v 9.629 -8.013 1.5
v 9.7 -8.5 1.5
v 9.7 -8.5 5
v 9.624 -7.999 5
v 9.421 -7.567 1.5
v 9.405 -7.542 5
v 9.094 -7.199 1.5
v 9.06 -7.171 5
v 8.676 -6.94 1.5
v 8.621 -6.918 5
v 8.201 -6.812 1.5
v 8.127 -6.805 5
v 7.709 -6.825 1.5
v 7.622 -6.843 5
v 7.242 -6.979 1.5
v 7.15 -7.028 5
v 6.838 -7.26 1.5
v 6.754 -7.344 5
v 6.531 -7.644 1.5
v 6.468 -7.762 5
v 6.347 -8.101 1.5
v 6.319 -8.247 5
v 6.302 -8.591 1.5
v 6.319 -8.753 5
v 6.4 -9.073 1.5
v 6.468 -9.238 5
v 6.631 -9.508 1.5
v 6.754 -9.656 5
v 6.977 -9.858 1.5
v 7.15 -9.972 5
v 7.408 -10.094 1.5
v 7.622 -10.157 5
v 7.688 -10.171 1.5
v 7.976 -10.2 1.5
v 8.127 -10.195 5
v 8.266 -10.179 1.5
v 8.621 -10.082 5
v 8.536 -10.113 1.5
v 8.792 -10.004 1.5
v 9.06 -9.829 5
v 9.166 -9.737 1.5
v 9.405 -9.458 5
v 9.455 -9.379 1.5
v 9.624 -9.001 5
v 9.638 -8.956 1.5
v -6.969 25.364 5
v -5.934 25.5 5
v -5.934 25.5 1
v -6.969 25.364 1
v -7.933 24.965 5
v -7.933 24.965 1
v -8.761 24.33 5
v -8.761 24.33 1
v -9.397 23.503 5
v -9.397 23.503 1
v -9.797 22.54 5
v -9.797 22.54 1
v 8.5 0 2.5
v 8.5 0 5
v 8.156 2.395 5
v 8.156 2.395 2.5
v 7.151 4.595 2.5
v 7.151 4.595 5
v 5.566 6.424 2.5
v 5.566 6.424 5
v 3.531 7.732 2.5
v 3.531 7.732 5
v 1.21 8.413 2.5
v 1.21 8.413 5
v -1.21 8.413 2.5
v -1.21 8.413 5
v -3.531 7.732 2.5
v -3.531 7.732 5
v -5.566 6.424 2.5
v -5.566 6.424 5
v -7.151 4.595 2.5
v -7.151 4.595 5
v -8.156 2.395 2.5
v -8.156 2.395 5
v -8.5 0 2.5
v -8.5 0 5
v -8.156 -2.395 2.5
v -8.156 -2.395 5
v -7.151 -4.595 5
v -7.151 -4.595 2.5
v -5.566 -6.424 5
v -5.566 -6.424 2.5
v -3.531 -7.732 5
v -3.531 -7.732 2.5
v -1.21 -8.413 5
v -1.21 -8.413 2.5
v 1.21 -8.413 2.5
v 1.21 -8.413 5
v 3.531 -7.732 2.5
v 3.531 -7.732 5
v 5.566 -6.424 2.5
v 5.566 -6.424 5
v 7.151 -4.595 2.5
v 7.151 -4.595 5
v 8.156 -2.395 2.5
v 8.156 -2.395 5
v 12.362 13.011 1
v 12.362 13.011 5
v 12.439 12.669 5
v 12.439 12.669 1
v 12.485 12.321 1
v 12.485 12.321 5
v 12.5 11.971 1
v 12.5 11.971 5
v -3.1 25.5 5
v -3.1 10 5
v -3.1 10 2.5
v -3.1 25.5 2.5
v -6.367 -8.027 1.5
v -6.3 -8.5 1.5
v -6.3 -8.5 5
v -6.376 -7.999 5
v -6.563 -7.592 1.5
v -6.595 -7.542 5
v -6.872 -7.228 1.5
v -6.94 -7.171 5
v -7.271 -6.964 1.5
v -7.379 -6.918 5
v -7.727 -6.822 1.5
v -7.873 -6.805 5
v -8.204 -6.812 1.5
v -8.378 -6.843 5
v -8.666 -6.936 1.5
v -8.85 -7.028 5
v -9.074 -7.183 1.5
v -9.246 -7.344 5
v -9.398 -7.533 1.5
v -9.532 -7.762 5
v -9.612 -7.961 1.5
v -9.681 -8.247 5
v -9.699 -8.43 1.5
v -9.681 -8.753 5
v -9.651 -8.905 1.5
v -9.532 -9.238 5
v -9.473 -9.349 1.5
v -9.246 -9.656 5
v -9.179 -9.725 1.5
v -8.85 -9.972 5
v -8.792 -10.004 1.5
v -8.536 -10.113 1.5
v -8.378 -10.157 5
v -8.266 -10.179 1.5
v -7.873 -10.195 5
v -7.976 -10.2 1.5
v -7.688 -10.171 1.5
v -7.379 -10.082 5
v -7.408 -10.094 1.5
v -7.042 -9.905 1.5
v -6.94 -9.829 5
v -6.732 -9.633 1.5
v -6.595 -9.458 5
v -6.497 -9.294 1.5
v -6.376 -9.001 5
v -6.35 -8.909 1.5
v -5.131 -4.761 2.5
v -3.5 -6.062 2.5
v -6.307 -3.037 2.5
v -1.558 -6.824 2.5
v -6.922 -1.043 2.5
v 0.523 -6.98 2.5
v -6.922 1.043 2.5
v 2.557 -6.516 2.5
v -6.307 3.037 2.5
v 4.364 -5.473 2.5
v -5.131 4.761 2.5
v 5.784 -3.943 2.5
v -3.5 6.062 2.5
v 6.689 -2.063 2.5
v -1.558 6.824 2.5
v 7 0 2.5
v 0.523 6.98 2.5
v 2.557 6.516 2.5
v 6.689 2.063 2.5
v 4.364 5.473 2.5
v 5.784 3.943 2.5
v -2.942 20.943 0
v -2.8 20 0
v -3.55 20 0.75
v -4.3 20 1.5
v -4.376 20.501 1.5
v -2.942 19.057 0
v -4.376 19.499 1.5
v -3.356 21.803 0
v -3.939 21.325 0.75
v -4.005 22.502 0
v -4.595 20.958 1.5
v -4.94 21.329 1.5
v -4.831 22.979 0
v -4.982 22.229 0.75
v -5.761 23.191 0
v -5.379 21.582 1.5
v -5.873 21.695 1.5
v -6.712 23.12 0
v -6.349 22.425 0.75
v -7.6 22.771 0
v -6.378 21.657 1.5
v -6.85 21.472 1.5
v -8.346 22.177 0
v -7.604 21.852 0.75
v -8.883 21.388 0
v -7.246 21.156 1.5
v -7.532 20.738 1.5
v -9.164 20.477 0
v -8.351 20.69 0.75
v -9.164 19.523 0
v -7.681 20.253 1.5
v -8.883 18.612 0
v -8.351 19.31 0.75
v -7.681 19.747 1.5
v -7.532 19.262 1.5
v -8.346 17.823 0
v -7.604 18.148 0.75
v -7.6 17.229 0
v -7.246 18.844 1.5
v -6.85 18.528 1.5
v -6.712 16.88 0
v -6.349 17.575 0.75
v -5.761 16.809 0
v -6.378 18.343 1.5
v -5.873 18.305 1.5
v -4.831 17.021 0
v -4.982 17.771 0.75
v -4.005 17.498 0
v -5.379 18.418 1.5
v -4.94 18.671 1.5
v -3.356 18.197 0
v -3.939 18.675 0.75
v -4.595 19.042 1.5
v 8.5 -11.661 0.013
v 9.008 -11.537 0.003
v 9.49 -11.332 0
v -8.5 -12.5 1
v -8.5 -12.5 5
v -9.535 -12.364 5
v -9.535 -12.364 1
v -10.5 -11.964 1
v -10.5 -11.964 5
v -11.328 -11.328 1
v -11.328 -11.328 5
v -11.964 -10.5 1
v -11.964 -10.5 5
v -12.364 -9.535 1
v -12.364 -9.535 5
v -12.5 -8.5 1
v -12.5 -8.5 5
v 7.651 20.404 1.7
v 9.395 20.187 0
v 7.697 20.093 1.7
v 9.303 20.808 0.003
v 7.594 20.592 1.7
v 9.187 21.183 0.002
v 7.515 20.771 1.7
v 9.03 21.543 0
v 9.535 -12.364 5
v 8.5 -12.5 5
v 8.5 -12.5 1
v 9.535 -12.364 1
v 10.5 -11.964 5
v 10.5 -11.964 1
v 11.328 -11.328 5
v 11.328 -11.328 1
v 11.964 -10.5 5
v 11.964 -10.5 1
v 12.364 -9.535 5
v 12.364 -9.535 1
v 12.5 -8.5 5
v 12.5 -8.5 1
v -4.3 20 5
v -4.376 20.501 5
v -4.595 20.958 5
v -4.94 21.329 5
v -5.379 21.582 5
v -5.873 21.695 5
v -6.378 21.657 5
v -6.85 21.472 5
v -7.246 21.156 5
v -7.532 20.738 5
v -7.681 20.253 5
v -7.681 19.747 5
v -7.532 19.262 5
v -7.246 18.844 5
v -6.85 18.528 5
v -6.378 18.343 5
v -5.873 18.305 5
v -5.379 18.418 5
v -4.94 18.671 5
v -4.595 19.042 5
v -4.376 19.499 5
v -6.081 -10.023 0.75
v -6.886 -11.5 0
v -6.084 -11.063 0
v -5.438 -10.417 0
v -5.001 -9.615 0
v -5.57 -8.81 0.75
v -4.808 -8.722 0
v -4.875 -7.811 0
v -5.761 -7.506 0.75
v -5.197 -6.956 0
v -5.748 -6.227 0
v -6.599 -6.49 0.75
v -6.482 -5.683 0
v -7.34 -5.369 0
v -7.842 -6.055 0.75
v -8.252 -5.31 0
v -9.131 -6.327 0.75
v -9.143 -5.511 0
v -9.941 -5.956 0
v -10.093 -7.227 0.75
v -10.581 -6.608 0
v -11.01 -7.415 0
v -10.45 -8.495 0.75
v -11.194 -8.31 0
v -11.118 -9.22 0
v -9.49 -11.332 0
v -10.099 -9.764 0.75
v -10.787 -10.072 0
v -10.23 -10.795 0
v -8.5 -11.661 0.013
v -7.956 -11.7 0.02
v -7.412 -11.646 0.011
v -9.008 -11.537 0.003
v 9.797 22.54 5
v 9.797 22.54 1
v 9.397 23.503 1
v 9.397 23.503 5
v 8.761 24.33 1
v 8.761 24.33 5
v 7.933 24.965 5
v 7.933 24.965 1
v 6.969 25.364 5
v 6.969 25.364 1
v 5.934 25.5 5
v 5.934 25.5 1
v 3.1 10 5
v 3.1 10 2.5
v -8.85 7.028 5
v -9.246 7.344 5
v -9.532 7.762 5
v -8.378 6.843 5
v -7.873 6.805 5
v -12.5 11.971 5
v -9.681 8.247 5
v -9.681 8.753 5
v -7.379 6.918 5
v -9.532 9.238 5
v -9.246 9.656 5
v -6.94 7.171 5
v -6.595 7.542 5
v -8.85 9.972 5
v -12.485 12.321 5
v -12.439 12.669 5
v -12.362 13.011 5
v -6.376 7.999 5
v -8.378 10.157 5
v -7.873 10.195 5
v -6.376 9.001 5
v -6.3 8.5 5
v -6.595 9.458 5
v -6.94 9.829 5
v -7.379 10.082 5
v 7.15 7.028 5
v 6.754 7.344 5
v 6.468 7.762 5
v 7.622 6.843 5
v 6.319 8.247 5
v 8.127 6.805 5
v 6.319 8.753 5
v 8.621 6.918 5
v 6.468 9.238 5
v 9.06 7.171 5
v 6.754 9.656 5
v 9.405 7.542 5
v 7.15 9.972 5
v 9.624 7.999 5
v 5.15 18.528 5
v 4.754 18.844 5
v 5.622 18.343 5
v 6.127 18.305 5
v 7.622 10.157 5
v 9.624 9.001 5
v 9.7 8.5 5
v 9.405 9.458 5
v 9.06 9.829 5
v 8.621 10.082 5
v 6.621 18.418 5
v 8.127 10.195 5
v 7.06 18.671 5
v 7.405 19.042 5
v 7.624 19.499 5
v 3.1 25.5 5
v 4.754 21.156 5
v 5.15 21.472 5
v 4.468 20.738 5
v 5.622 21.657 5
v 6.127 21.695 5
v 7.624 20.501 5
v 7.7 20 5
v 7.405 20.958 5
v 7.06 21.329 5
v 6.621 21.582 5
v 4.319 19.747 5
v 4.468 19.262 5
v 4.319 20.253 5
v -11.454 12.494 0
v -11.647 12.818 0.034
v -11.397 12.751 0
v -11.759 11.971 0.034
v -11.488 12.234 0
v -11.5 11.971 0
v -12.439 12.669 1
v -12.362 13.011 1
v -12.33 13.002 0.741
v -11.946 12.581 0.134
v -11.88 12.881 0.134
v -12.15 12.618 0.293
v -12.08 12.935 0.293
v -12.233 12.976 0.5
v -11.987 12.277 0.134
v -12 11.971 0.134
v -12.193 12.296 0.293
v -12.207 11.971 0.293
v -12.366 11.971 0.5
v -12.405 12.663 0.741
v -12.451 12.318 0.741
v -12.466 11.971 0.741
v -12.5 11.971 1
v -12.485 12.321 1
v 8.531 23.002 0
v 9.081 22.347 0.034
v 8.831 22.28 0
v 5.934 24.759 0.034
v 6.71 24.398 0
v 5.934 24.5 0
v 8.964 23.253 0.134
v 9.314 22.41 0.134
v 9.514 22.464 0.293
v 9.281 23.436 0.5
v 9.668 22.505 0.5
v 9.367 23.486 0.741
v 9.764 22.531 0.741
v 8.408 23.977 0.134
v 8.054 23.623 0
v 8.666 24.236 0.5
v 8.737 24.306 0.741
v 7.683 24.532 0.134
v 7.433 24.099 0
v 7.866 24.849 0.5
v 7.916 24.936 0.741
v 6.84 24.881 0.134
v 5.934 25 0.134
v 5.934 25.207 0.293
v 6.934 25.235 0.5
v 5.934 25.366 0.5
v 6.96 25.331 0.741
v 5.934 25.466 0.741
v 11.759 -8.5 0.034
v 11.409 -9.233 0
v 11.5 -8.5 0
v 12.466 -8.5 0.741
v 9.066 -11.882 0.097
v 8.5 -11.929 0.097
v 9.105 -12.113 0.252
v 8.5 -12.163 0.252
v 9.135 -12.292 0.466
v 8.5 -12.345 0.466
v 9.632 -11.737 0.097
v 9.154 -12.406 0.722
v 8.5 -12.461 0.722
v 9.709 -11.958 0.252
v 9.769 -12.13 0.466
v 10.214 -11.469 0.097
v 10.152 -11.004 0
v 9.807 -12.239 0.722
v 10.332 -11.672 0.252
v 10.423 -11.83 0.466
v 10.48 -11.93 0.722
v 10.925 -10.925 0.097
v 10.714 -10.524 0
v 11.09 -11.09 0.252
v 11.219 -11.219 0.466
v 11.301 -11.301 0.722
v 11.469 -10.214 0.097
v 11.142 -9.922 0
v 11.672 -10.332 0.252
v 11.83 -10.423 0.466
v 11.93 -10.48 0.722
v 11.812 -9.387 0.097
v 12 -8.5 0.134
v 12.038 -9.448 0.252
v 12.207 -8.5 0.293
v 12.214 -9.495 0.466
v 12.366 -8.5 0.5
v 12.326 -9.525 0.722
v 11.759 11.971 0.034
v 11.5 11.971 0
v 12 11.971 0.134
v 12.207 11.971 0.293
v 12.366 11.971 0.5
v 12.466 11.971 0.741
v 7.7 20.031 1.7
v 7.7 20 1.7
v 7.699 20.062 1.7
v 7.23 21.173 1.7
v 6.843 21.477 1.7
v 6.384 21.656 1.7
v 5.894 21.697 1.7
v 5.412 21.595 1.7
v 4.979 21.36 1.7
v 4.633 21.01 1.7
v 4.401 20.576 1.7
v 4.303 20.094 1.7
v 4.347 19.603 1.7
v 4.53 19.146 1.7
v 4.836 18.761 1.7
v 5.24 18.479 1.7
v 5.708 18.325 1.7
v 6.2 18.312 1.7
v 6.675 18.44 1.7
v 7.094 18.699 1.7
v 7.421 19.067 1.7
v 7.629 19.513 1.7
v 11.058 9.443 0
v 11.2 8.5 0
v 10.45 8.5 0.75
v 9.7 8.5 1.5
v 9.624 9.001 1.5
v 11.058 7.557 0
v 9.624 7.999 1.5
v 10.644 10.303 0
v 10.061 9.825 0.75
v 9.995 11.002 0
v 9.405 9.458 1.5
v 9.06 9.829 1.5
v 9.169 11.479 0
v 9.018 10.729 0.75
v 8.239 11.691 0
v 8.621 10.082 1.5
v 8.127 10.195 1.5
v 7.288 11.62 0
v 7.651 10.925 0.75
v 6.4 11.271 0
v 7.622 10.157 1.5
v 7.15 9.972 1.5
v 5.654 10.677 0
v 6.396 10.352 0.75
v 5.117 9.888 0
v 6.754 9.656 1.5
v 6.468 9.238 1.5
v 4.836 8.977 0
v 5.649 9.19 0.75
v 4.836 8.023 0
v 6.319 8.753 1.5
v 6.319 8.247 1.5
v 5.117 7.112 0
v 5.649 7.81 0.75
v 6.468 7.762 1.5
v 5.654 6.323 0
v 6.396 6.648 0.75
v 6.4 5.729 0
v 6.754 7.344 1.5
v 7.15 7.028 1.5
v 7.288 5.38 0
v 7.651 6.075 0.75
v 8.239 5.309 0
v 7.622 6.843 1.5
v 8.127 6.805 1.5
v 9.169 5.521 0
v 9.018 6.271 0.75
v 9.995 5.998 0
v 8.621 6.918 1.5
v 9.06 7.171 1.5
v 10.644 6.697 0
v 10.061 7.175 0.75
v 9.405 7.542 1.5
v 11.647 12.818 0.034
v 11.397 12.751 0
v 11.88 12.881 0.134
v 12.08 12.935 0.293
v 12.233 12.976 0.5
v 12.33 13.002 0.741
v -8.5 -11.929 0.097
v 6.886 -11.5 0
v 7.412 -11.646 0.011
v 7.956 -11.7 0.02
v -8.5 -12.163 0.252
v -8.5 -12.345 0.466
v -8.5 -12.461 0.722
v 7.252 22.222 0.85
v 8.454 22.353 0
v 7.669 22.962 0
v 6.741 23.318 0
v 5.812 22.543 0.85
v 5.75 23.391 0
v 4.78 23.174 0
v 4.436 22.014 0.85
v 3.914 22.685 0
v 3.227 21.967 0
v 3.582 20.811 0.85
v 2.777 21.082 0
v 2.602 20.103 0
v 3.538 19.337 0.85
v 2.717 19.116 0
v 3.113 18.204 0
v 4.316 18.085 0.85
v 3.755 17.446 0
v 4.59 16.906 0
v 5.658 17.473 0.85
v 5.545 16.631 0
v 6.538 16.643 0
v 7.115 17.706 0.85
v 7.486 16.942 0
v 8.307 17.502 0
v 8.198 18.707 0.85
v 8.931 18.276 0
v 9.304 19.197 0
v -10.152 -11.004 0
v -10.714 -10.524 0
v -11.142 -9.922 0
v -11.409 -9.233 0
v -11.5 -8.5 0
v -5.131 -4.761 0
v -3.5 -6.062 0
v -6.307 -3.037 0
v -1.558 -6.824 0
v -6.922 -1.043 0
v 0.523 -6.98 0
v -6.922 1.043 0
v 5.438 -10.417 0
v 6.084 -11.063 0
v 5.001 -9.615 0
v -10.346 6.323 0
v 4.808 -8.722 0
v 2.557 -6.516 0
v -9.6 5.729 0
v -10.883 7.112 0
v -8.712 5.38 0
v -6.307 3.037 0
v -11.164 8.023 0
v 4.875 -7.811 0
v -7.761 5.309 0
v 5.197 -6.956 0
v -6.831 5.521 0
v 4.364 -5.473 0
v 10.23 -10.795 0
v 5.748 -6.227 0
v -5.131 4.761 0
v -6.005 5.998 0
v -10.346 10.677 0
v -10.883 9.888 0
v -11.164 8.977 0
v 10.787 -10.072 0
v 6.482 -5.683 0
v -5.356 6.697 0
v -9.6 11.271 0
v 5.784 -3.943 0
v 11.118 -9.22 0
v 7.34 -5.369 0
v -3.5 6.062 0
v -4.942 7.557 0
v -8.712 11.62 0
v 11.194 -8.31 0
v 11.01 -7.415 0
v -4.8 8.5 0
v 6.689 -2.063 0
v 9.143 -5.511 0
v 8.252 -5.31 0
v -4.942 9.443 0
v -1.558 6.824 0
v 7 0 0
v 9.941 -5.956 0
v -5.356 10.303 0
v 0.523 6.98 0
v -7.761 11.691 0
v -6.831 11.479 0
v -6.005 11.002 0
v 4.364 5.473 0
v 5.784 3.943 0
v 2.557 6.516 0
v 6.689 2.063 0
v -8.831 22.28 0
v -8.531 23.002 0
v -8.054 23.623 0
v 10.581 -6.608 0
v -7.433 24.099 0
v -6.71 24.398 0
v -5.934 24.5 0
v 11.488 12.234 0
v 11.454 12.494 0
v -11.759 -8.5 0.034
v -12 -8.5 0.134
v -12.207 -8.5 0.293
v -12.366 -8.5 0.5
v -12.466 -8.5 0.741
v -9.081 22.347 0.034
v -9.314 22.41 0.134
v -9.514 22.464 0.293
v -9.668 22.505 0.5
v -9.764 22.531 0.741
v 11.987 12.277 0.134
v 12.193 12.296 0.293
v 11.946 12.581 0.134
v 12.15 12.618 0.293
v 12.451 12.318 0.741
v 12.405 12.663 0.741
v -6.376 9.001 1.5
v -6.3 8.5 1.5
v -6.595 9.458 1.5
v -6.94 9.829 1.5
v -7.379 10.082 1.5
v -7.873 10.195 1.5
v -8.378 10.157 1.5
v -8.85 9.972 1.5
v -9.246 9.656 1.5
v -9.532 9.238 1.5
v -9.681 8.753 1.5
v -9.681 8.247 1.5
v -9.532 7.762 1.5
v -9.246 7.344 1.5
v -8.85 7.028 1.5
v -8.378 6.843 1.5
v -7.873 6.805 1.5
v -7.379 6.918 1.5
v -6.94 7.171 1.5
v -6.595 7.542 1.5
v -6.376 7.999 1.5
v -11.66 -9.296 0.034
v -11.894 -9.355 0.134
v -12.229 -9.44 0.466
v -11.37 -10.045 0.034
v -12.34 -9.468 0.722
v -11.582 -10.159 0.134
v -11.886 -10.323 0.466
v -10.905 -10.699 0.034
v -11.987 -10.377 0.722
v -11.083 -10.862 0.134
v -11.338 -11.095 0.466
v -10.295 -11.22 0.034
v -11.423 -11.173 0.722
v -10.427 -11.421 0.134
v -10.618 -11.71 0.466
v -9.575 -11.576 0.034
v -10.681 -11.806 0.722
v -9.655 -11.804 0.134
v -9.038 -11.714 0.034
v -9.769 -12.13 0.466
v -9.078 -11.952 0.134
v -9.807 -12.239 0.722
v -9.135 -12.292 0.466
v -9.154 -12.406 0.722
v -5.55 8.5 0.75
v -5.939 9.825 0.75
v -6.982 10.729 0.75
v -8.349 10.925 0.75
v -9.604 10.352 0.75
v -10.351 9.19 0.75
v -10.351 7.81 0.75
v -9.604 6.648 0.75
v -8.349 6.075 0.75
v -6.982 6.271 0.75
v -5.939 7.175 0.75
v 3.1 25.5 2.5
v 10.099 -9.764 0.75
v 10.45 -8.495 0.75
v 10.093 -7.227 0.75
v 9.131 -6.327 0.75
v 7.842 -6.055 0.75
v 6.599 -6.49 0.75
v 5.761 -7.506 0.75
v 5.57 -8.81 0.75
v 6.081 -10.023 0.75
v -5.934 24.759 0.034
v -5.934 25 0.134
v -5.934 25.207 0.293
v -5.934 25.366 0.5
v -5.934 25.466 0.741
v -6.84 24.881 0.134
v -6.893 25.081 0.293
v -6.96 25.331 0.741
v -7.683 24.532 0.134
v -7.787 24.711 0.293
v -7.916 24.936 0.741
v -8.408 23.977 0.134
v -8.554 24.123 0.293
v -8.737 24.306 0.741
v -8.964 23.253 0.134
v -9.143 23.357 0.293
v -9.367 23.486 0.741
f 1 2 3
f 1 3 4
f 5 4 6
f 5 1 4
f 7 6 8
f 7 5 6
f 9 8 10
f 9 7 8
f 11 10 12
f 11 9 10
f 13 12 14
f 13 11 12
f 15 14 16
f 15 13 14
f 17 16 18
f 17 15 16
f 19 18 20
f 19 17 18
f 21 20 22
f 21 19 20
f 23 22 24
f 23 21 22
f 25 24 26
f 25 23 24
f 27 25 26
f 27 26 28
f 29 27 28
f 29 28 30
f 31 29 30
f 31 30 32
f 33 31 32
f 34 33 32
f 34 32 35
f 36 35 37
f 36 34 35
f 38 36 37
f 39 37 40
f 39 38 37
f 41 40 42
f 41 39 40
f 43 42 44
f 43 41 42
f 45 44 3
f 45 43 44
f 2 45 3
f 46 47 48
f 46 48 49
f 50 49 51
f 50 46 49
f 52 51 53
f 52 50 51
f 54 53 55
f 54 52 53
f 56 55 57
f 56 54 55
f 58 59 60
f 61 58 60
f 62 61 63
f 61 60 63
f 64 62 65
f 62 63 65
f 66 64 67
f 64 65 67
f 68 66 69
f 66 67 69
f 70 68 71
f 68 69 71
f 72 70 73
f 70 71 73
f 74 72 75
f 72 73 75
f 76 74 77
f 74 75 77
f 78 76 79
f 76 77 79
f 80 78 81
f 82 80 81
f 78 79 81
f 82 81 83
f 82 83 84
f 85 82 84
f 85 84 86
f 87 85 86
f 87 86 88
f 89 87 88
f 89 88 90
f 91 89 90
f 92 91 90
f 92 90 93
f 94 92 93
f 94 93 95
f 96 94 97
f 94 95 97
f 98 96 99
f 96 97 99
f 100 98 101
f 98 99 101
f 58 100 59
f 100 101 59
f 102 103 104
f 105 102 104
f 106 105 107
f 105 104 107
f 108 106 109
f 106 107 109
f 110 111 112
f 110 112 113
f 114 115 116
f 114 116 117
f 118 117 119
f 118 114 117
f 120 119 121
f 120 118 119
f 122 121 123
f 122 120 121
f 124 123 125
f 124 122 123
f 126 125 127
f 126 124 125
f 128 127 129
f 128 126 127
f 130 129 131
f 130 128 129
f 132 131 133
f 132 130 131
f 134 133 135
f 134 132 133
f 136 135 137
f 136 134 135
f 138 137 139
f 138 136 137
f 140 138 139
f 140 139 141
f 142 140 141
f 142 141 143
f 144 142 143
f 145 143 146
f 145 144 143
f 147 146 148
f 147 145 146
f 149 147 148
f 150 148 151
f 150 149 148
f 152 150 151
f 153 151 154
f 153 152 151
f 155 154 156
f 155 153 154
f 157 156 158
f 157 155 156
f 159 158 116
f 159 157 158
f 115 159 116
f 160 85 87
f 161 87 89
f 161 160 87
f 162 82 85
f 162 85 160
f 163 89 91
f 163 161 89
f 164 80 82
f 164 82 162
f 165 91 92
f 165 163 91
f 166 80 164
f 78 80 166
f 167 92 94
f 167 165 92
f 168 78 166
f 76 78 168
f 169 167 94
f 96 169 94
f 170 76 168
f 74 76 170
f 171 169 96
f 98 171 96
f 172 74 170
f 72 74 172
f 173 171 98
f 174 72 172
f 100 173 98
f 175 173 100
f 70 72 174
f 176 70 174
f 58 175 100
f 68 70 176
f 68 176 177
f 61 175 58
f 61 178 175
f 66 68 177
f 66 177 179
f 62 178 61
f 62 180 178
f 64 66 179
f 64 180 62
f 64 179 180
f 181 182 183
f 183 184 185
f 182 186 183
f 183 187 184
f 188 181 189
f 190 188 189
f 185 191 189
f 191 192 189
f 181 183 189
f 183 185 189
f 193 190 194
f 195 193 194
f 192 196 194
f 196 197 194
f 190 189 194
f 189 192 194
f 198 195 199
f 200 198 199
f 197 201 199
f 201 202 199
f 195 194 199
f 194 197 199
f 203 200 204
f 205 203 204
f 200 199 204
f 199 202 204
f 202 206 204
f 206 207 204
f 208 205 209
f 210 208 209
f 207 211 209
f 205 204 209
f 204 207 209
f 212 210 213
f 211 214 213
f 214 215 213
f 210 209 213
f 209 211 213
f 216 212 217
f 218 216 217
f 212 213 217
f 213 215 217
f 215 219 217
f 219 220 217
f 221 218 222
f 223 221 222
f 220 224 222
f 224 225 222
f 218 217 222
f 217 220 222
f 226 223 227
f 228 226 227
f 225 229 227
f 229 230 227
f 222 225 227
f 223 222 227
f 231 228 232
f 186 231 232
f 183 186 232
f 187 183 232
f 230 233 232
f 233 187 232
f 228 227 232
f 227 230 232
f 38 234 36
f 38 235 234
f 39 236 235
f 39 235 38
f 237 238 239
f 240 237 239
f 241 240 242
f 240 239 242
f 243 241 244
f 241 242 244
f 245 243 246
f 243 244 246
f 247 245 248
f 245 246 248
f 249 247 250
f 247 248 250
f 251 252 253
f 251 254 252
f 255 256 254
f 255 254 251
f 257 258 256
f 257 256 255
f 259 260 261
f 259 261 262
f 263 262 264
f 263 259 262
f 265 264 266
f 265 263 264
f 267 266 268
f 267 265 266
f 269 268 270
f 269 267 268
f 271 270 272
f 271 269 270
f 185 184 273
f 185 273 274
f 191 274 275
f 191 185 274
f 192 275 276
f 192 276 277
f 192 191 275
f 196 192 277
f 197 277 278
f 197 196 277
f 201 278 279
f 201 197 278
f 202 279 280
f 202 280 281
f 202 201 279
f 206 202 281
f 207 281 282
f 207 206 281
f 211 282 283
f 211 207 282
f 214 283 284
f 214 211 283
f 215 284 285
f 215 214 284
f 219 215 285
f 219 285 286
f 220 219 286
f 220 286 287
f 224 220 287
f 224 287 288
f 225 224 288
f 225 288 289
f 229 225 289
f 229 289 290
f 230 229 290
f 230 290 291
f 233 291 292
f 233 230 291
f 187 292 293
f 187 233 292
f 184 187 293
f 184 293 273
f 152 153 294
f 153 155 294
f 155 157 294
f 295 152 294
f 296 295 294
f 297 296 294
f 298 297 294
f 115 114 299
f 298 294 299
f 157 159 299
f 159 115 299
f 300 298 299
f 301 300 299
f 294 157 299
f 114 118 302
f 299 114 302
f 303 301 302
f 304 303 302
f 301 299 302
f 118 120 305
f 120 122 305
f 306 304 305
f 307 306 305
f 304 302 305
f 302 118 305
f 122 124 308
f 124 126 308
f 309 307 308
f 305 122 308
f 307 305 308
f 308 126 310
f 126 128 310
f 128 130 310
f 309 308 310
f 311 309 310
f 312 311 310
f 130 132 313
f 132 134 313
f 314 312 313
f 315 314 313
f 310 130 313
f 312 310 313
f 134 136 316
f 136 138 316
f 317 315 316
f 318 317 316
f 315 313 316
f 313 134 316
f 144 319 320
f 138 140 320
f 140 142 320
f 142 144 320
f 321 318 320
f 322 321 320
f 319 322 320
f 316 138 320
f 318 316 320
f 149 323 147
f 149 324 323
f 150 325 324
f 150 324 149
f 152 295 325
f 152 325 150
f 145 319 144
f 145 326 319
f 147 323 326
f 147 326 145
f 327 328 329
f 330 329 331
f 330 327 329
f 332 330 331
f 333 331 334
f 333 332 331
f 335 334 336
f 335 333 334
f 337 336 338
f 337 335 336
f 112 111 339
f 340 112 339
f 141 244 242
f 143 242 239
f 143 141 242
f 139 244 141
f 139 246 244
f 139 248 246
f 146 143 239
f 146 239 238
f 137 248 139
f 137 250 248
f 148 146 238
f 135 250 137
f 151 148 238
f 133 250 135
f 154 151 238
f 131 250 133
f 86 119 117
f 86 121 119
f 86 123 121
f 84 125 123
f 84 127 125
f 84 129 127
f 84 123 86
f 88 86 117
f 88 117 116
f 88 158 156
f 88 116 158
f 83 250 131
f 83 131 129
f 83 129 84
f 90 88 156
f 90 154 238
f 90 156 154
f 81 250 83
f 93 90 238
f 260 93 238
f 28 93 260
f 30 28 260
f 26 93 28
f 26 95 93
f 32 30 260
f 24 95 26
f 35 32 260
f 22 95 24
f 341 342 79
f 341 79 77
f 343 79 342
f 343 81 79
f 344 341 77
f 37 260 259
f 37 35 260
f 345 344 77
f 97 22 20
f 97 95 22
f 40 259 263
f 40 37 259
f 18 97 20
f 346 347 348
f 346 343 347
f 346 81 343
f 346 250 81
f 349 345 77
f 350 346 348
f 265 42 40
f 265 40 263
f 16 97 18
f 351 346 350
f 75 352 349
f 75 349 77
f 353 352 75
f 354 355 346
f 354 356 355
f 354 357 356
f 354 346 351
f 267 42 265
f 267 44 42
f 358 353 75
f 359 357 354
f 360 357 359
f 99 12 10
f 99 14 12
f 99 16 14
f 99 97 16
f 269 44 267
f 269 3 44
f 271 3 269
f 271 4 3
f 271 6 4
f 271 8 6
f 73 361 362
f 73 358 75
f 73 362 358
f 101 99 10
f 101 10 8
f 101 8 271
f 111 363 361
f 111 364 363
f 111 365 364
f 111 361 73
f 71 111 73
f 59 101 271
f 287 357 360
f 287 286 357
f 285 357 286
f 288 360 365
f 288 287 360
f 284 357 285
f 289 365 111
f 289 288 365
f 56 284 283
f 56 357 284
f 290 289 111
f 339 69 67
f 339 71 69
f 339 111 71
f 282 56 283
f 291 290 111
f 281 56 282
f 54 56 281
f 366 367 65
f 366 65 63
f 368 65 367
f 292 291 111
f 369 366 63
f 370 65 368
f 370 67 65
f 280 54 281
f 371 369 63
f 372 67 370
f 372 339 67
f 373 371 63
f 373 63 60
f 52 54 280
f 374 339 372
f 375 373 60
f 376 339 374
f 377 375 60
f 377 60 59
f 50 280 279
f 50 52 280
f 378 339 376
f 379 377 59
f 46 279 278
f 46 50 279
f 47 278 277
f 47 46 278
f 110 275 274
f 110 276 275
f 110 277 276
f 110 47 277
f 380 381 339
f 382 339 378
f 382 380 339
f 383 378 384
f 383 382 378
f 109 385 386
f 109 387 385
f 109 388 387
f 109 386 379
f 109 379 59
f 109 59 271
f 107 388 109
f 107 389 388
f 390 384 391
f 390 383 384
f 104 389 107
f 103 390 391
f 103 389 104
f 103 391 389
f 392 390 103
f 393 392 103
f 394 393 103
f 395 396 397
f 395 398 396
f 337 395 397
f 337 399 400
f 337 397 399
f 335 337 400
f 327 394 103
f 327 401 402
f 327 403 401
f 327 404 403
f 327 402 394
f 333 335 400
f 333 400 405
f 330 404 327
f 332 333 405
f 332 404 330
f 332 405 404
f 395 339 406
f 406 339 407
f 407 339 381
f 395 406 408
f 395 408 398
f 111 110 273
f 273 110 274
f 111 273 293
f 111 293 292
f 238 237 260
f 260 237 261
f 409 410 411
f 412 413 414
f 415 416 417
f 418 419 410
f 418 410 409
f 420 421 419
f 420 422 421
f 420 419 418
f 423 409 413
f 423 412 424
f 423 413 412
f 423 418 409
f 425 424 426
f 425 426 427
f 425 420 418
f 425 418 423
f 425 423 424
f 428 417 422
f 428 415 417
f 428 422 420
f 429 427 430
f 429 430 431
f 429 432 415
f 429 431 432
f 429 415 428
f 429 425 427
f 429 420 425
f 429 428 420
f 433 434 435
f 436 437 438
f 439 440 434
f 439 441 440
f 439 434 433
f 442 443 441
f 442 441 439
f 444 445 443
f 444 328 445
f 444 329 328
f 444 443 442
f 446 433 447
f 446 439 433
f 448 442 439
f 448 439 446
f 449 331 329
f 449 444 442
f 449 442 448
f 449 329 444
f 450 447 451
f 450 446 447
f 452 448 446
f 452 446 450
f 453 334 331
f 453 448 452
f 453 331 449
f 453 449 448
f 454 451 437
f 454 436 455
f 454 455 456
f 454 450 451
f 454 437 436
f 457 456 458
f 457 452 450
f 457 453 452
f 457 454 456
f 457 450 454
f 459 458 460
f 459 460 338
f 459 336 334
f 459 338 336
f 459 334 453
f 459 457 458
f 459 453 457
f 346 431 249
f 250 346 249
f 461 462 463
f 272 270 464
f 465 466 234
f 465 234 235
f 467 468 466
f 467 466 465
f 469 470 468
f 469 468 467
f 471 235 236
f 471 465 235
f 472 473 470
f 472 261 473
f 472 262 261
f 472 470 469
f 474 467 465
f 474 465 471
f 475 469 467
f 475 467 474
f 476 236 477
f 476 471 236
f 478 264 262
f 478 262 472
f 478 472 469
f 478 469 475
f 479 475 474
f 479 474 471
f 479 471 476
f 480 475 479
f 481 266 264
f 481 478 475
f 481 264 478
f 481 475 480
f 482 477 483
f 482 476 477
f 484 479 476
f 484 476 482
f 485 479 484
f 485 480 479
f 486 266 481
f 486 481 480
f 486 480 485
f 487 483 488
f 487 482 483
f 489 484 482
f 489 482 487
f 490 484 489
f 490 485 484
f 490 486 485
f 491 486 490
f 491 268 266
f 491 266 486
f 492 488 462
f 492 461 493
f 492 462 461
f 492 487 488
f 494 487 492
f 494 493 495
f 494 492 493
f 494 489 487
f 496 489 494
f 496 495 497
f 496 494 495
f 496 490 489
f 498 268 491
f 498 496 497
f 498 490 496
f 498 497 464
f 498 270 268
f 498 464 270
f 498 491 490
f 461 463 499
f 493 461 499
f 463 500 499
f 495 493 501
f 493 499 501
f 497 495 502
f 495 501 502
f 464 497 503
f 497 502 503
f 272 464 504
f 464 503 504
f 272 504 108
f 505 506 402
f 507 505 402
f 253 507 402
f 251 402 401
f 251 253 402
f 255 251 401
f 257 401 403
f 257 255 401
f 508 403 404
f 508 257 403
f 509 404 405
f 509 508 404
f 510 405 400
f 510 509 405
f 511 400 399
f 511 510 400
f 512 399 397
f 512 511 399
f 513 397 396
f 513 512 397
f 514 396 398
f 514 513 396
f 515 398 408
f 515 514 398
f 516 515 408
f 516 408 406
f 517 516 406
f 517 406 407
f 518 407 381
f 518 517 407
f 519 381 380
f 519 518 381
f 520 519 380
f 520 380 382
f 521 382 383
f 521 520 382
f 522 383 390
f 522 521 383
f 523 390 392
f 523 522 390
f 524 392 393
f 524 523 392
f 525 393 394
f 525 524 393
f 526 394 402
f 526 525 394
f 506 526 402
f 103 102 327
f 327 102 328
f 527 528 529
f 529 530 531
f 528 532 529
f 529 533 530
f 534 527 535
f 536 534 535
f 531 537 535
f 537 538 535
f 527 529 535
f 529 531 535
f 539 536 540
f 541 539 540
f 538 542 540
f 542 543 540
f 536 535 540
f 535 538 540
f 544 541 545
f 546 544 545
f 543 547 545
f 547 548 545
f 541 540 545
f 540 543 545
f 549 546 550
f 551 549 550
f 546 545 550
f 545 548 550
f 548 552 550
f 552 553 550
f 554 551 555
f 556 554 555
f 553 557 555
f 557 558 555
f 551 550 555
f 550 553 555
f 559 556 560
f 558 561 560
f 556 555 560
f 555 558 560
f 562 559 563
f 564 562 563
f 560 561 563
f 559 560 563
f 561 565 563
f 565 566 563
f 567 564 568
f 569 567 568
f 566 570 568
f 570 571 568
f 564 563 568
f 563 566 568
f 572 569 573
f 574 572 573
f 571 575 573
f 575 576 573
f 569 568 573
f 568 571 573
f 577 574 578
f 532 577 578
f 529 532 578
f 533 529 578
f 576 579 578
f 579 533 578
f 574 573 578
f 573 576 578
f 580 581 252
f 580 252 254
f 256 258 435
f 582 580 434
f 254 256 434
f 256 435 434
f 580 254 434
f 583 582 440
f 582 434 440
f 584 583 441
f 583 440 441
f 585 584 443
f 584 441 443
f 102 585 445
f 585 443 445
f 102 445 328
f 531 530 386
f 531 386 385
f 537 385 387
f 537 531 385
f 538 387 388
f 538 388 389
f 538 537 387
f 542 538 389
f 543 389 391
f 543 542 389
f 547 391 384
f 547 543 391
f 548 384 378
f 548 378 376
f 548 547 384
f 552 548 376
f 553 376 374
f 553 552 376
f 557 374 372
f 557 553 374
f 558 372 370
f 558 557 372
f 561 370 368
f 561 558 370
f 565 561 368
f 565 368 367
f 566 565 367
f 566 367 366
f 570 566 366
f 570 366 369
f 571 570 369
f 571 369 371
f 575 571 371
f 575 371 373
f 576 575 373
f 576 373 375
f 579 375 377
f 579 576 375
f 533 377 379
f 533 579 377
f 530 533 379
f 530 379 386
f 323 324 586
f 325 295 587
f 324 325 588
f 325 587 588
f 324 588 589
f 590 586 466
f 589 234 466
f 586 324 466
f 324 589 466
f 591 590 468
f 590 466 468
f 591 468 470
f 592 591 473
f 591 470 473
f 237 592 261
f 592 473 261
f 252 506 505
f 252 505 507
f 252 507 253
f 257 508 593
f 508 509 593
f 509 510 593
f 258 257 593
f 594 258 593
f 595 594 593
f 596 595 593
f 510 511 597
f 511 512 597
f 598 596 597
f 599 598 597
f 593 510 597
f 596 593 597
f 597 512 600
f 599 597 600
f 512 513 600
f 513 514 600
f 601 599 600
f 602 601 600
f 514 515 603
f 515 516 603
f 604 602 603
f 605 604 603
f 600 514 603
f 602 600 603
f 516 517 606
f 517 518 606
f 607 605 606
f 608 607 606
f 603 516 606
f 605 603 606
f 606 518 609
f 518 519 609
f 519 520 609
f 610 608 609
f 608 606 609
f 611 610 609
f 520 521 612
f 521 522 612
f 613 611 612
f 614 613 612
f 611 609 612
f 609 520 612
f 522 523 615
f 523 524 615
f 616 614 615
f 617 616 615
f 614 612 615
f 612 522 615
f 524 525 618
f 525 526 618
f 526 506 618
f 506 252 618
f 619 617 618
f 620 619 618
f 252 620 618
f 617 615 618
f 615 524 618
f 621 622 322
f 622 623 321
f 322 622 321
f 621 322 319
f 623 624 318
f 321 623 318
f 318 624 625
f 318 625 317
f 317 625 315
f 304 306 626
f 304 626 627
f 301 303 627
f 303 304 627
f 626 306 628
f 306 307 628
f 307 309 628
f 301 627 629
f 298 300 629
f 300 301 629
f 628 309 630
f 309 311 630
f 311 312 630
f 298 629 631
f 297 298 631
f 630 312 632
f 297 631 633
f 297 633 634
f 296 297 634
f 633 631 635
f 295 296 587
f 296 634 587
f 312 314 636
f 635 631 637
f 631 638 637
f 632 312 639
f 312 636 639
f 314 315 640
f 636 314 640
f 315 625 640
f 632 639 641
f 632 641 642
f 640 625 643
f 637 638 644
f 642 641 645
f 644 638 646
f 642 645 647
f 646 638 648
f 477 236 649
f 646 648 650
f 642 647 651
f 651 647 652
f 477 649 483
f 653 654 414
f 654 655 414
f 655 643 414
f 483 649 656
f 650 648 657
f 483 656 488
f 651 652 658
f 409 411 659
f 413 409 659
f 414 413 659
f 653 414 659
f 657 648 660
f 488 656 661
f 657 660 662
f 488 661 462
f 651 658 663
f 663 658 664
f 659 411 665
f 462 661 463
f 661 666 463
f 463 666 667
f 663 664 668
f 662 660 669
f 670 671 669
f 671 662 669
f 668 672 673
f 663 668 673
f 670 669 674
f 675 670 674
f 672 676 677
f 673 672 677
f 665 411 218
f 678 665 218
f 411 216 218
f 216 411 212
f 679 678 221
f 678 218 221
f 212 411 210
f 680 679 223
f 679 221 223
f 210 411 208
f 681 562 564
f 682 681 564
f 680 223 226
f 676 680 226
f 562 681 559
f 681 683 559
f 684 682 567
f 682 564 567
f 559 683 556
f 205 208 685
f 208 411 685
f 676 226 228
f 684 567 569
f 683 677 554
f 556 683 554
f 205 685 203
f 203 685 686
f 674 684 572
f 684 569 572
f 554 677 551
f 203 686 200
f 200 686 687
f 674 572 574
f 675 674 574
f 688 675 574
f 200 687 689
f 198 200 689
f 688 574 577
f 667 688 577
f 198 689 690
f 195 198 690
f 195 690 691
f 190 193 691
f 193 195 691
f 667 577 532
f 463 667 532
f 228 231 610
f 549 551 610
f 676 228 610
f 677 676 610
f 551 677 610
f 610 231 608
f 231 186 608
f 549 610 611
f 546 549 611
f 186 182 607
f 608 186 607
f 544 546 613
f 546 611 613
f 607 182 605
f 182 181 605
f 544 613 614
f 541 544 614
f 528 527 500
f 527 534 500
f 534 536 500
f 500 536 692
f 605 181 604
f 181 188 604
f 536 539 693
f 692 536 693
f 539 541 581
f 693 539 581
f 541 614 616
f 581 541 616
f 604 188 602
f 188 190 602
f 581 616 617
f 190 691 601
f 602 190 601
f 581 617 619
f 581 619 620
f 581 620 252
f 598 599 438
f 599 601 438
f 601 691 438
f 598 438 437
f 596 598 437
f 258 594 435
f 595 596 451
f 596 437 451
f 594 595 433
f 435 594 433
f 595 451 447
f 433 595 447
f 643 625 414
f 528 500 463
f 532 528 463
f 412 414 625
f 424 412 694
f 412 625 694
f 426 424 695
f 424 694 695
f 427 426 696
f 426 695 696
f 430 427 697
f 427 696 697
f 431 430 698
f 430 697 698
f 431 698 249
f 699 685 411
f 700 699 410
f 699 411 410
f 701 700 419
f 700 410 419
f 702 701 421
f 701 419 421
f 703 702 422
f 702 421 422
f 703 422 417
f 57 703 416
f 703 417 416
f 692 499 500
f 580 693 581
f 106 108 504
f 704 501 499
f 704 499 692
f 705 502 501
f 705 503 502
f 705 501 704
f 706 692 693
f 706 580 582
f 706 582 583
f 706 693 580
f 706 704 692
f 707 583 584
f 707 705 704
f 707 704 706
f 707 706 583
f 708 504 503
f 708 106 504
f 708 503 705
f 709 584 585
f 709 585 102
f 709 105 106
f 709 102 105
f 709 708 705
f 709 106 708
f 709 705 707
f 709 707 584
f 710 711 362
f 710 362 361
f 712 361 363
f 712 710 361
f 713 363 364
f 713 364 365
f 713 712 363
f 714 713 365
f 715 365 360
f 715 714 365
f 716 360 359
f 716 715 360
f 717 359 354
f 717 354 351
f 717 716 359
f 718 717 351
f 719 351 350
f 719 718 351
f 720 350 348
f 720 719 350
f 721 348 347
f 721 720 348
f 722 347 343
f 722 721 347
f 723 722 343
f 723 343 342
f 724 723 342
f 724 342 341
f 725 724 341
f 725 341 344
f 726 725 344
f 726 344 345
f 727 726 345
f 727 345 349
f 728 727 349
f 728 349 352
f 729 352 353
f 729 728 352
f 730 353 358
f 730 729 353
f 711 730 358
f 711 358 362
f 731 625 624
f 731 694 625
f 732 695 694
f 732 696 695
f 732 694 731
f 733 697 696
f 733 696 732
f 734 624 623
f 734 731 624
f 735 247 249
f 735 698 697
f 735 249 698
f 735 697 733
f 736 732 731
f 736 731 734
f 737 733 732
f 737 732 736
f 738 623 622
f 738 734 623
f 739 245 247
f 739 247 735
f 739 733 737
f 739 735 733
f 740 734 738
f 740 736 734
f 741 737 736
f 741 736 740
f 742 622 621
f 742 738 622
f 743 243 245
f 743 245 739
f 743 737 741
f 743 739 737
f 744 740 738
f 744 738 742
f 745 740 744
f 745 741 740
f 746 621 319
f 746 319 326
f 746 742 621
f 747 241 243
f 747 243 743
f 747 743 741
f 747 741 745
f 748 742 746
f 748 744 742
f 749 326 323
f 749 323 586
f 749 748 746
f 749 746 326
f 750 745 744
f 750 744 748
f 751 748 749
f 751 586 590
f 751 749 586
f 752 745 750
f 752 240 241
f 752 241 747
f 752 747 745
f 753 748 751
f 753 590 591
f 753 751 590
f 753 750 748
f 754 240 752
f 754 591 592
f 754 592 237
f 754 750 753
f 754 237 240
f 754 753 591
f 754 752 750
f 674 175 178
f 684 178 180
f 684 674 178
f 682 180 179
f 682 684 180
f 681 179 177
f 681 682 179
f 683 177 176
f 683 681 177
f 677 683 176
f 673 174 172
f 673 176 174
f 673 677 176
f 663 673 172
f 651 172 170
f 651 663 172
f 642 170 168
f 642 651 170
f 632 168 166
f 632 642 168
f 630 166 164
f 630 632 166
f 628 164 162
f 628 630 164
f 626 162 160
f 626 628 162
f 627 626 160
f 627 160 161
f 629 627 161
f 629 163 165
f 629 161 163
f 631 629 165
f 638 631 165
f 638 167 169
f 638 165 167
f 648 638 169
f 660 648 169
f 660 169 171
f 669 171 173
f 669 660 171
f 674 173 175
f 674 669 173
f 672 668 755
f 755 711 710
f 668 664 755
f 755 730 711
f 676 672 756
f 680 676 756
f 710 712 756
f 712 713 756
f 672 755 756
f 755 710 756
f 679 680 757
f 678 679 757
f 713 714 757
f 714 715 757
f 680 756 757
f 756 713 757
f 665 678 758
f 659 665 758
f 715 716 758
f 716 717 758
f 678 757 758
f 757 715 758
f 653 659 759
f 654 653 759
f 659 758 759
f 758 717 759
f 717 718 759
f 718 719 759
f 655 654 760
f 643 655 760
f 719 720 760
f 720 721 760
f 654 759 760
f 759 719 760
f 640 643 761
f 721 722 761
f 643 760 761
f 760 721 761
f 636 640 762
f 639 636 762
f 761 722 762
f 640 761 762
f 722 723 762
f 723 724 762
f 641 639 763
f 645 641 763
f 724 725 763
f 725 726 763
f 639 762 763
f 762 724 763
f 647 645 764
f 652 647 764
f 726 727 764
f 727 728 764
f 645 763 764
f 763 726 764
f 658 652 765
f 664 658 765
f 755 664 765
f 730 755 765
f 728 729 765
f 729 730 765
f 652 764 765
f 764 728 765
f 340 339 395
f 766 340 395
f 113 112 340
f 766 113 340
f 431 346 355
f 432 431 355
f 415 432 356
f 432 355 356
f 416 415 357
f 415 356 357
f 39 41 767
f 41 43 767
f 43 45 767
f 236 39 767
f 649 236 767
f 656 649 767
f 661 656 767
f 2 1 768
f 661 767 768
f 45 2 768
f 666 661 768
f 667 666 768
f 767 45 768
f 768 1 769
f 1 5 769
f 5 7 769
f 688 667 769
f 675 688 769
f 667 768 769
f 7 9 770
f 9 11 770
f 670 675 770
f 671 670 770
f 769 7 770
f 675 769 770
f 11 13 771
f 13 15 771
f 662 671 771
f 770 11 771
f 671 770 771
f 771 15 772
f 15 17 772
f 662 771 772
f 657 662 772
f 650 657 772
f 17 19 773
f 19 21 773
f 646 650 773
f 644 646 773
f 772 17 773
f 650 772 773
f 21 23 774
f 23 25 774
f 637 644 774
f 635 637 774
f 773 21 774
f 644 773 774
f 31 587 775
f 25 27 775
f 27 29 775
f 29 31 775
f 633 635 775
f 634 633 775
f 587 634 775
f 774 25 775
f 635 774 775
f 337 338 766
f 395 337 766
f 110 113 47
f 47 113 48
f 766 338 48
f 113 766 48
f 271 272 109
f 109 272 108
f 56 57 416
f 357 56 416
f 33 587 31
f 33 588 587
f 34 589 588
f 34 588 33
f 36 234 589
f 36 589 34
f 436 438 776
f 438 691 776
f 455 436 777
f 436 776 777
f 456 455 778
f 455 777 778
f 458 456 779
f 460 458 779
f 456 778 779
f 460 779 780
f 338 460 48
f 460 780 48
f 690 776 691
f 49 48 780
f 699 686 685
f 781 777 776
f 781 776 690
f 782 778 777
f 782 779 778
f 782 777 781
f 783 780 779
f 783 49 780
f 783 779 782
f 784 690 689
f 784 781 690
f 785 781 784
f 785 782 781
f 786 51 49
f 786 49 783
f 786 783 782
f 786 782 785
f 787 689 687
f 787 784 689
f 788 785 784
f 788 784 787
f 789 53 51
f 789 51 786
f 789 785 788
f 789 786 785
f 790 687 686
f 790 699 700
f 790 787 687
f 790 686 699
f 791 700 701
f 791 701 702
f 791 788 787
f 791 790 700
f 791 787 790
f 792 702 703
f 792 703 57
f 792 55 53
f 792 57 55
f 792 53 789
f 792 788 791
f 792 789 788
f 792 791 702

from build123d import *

# Parameters (mm, degrees)
SKETCH_R        = 7
SKETCH_R_2      = 1.7
PAD_DEPTH       = 5
SKETCH001_R     = 8.5
SKETCH001_W     = 6.2
SKETCH001_H     = 20
POCKET_DEPTH    = 2.5
FILLET_R        = 4
FILLET001_R     = 4
FILLET002_R     = 4
FILLET003_R     = 4
FILLET004_R     = 4
FILLET005_R     = 4
FILLET006_R     = 1
CHAMFER_SIZE    = 1.5
CHAMFER001_SIZE = 1.5
CHAMFER002_SIZE = 1.5
CHAMFER003_SIZE = 1.5
CHAMFER004_SIZE = 1.5
CHAMFER005_SIZE = 1.7


with BuildPart() as part:
    # Sketch → Pad (new body)
    with BuildSketch(Plane.XY):
        Polygon((-12.5, -12.5), (12.5, -12.5), (12.5, 12.5), (9, 25.5), (-9, 25.5), (-12.5, 12.5), align=None)
        Circle(SKETCH_R, mode=Mode.SUBTRACT)
        with Locations((-8, 8.5)):
            Circle(SKETCH_R_2, mode=Mode.SUBTRACT)
        with Locations((8, 8.5)):
            Circle(SKETCH_R_2, mode=Mode.SUBTRACT)
        with Locations((-8, -8.5)):
            Circle(SKETCH_R_2, mode=Mode.SUBTRACT)
        with Locations((8, -8.5)):
            Circle(SKETCH_R_2, mode=Mode.SUBTRACT)
        with Locations((-6, 20)):
            Circle(SKETCH_R_2, mode=Mode.SUBTRACT)
        with Locations((6, 20)):
            Circle(SKETCH_R_2, mode=Mode.SUBTRACT)
    extrude(amount=PAD_DEPTH)

    # Sketch001 → Pocket (cut)
    with BuildSketch(Plane.XY.offset(5)):
        Circle(SKETCH001_R)
        with Locations((0, 20)):
            Rectangle(SKETCH001_W, SKETCH001_H)
    extrude(amount=-POCKET_DEPTH, mode=Mode.SUBTRACT)

    # Fillet
    fillet_edges = [part.edges().sort_by_distance(p)[0] for p in [
        (-12.5, -12.5, 2.5),
    ]]
    fillet(fillet_edges, radius=FILLET_R)

    # Fillet001
    fillet001_edges = [part.edges().sort_by_distance(p)[0] for p in [
        (12.5, -12.5, 2.5),
    ]]
    fillet(fillet001_edges, radius=FILLET001_R)

    # Fillet002
    fillet002_edges = [part.edges().sort_by_distance(p)[0] for p in [
        (-12.5, 12.5, 2.5),
    ]]
    fillet(fillet002_edges, radius=FILLET002_R)

    # Fillet003
    fillet003_edges = [part.edges().sort_by_distance(p)[0] for p in [
        (12.5, 12.5, 2.5),
    ]]
    fillet(fillet003_edges, radius=FILLET003_R)

    # Fillet004
    fillet004_edges = [part.edges().sort_by_distance(p)[0] for p in [
        (9, 25.5, 2.5),
    ]]
    fillet(fillet004_edges, radius=FILLET004_R)

    # Fillet005
    fillet005_edges = [part.edges().sort_by_distance(p)[0] for p in [
        (-9, 25.5, 2.5),
    ]]
    fillet(fillet005_edges, radius=FILLET005_R)

    # Fillet006
    fillet006_edges = [part.edges().sort_by_distance(p)[0] for p in [
        (0, 25.5, 0),
    ]]
    fillet(fillet006_edges, radius=FILLET006_R)

    # Chamfer
    chamfer_edges = [part.edges().sort_by_distance(p)[0] for p in [
        (-9.7, -8.5, 0),
    ]]
    chamfer(chamfer_edges, length=CHAMFER_SIZE)

    # Chamfer001
    chamfer001_edges = [part.edges().sort_by_distance(p)[0] for p in [
        (-9.7, 8.5, 0),
    ]]
    chamfer(chamfer001_edges, length=CHAMFER001_SIZE)

    # Chamfer002
    chamfer002_edges = [part.edges().sort_by_distance(p)[0] for p in [
        (6.3, -8.5, 0),
    ]]
    chamfer(chamfer002_edges, length=CHAMFER002_SIZE)

    # Chamfer003
    chamfer003_edges = [part.edges().sort_by_distance(p)[0] for p in [
        (6.3, 8.5, 0),
    ]]
    chamfer(chamfer003_edges, length=CHAMFER003_SIZE)

    # Chamfer004
    chamfer004_edges = [part.edges().sort_by_distance(p)[0] for p in [
        (-7.7, 20, 0),
    ]]
    chamfer(chamfer004_edges, length=CHAMFER004_SIZE)

    # Chamfer005
    chamfer005_edges = [part.edges().sort_by_distance(p)[0] for p in [
        (4.3, 20, 0),
    ]]
    chamfer(chamfer005_edges, length=CHAMFER005_SIZE)


solid = part.part
